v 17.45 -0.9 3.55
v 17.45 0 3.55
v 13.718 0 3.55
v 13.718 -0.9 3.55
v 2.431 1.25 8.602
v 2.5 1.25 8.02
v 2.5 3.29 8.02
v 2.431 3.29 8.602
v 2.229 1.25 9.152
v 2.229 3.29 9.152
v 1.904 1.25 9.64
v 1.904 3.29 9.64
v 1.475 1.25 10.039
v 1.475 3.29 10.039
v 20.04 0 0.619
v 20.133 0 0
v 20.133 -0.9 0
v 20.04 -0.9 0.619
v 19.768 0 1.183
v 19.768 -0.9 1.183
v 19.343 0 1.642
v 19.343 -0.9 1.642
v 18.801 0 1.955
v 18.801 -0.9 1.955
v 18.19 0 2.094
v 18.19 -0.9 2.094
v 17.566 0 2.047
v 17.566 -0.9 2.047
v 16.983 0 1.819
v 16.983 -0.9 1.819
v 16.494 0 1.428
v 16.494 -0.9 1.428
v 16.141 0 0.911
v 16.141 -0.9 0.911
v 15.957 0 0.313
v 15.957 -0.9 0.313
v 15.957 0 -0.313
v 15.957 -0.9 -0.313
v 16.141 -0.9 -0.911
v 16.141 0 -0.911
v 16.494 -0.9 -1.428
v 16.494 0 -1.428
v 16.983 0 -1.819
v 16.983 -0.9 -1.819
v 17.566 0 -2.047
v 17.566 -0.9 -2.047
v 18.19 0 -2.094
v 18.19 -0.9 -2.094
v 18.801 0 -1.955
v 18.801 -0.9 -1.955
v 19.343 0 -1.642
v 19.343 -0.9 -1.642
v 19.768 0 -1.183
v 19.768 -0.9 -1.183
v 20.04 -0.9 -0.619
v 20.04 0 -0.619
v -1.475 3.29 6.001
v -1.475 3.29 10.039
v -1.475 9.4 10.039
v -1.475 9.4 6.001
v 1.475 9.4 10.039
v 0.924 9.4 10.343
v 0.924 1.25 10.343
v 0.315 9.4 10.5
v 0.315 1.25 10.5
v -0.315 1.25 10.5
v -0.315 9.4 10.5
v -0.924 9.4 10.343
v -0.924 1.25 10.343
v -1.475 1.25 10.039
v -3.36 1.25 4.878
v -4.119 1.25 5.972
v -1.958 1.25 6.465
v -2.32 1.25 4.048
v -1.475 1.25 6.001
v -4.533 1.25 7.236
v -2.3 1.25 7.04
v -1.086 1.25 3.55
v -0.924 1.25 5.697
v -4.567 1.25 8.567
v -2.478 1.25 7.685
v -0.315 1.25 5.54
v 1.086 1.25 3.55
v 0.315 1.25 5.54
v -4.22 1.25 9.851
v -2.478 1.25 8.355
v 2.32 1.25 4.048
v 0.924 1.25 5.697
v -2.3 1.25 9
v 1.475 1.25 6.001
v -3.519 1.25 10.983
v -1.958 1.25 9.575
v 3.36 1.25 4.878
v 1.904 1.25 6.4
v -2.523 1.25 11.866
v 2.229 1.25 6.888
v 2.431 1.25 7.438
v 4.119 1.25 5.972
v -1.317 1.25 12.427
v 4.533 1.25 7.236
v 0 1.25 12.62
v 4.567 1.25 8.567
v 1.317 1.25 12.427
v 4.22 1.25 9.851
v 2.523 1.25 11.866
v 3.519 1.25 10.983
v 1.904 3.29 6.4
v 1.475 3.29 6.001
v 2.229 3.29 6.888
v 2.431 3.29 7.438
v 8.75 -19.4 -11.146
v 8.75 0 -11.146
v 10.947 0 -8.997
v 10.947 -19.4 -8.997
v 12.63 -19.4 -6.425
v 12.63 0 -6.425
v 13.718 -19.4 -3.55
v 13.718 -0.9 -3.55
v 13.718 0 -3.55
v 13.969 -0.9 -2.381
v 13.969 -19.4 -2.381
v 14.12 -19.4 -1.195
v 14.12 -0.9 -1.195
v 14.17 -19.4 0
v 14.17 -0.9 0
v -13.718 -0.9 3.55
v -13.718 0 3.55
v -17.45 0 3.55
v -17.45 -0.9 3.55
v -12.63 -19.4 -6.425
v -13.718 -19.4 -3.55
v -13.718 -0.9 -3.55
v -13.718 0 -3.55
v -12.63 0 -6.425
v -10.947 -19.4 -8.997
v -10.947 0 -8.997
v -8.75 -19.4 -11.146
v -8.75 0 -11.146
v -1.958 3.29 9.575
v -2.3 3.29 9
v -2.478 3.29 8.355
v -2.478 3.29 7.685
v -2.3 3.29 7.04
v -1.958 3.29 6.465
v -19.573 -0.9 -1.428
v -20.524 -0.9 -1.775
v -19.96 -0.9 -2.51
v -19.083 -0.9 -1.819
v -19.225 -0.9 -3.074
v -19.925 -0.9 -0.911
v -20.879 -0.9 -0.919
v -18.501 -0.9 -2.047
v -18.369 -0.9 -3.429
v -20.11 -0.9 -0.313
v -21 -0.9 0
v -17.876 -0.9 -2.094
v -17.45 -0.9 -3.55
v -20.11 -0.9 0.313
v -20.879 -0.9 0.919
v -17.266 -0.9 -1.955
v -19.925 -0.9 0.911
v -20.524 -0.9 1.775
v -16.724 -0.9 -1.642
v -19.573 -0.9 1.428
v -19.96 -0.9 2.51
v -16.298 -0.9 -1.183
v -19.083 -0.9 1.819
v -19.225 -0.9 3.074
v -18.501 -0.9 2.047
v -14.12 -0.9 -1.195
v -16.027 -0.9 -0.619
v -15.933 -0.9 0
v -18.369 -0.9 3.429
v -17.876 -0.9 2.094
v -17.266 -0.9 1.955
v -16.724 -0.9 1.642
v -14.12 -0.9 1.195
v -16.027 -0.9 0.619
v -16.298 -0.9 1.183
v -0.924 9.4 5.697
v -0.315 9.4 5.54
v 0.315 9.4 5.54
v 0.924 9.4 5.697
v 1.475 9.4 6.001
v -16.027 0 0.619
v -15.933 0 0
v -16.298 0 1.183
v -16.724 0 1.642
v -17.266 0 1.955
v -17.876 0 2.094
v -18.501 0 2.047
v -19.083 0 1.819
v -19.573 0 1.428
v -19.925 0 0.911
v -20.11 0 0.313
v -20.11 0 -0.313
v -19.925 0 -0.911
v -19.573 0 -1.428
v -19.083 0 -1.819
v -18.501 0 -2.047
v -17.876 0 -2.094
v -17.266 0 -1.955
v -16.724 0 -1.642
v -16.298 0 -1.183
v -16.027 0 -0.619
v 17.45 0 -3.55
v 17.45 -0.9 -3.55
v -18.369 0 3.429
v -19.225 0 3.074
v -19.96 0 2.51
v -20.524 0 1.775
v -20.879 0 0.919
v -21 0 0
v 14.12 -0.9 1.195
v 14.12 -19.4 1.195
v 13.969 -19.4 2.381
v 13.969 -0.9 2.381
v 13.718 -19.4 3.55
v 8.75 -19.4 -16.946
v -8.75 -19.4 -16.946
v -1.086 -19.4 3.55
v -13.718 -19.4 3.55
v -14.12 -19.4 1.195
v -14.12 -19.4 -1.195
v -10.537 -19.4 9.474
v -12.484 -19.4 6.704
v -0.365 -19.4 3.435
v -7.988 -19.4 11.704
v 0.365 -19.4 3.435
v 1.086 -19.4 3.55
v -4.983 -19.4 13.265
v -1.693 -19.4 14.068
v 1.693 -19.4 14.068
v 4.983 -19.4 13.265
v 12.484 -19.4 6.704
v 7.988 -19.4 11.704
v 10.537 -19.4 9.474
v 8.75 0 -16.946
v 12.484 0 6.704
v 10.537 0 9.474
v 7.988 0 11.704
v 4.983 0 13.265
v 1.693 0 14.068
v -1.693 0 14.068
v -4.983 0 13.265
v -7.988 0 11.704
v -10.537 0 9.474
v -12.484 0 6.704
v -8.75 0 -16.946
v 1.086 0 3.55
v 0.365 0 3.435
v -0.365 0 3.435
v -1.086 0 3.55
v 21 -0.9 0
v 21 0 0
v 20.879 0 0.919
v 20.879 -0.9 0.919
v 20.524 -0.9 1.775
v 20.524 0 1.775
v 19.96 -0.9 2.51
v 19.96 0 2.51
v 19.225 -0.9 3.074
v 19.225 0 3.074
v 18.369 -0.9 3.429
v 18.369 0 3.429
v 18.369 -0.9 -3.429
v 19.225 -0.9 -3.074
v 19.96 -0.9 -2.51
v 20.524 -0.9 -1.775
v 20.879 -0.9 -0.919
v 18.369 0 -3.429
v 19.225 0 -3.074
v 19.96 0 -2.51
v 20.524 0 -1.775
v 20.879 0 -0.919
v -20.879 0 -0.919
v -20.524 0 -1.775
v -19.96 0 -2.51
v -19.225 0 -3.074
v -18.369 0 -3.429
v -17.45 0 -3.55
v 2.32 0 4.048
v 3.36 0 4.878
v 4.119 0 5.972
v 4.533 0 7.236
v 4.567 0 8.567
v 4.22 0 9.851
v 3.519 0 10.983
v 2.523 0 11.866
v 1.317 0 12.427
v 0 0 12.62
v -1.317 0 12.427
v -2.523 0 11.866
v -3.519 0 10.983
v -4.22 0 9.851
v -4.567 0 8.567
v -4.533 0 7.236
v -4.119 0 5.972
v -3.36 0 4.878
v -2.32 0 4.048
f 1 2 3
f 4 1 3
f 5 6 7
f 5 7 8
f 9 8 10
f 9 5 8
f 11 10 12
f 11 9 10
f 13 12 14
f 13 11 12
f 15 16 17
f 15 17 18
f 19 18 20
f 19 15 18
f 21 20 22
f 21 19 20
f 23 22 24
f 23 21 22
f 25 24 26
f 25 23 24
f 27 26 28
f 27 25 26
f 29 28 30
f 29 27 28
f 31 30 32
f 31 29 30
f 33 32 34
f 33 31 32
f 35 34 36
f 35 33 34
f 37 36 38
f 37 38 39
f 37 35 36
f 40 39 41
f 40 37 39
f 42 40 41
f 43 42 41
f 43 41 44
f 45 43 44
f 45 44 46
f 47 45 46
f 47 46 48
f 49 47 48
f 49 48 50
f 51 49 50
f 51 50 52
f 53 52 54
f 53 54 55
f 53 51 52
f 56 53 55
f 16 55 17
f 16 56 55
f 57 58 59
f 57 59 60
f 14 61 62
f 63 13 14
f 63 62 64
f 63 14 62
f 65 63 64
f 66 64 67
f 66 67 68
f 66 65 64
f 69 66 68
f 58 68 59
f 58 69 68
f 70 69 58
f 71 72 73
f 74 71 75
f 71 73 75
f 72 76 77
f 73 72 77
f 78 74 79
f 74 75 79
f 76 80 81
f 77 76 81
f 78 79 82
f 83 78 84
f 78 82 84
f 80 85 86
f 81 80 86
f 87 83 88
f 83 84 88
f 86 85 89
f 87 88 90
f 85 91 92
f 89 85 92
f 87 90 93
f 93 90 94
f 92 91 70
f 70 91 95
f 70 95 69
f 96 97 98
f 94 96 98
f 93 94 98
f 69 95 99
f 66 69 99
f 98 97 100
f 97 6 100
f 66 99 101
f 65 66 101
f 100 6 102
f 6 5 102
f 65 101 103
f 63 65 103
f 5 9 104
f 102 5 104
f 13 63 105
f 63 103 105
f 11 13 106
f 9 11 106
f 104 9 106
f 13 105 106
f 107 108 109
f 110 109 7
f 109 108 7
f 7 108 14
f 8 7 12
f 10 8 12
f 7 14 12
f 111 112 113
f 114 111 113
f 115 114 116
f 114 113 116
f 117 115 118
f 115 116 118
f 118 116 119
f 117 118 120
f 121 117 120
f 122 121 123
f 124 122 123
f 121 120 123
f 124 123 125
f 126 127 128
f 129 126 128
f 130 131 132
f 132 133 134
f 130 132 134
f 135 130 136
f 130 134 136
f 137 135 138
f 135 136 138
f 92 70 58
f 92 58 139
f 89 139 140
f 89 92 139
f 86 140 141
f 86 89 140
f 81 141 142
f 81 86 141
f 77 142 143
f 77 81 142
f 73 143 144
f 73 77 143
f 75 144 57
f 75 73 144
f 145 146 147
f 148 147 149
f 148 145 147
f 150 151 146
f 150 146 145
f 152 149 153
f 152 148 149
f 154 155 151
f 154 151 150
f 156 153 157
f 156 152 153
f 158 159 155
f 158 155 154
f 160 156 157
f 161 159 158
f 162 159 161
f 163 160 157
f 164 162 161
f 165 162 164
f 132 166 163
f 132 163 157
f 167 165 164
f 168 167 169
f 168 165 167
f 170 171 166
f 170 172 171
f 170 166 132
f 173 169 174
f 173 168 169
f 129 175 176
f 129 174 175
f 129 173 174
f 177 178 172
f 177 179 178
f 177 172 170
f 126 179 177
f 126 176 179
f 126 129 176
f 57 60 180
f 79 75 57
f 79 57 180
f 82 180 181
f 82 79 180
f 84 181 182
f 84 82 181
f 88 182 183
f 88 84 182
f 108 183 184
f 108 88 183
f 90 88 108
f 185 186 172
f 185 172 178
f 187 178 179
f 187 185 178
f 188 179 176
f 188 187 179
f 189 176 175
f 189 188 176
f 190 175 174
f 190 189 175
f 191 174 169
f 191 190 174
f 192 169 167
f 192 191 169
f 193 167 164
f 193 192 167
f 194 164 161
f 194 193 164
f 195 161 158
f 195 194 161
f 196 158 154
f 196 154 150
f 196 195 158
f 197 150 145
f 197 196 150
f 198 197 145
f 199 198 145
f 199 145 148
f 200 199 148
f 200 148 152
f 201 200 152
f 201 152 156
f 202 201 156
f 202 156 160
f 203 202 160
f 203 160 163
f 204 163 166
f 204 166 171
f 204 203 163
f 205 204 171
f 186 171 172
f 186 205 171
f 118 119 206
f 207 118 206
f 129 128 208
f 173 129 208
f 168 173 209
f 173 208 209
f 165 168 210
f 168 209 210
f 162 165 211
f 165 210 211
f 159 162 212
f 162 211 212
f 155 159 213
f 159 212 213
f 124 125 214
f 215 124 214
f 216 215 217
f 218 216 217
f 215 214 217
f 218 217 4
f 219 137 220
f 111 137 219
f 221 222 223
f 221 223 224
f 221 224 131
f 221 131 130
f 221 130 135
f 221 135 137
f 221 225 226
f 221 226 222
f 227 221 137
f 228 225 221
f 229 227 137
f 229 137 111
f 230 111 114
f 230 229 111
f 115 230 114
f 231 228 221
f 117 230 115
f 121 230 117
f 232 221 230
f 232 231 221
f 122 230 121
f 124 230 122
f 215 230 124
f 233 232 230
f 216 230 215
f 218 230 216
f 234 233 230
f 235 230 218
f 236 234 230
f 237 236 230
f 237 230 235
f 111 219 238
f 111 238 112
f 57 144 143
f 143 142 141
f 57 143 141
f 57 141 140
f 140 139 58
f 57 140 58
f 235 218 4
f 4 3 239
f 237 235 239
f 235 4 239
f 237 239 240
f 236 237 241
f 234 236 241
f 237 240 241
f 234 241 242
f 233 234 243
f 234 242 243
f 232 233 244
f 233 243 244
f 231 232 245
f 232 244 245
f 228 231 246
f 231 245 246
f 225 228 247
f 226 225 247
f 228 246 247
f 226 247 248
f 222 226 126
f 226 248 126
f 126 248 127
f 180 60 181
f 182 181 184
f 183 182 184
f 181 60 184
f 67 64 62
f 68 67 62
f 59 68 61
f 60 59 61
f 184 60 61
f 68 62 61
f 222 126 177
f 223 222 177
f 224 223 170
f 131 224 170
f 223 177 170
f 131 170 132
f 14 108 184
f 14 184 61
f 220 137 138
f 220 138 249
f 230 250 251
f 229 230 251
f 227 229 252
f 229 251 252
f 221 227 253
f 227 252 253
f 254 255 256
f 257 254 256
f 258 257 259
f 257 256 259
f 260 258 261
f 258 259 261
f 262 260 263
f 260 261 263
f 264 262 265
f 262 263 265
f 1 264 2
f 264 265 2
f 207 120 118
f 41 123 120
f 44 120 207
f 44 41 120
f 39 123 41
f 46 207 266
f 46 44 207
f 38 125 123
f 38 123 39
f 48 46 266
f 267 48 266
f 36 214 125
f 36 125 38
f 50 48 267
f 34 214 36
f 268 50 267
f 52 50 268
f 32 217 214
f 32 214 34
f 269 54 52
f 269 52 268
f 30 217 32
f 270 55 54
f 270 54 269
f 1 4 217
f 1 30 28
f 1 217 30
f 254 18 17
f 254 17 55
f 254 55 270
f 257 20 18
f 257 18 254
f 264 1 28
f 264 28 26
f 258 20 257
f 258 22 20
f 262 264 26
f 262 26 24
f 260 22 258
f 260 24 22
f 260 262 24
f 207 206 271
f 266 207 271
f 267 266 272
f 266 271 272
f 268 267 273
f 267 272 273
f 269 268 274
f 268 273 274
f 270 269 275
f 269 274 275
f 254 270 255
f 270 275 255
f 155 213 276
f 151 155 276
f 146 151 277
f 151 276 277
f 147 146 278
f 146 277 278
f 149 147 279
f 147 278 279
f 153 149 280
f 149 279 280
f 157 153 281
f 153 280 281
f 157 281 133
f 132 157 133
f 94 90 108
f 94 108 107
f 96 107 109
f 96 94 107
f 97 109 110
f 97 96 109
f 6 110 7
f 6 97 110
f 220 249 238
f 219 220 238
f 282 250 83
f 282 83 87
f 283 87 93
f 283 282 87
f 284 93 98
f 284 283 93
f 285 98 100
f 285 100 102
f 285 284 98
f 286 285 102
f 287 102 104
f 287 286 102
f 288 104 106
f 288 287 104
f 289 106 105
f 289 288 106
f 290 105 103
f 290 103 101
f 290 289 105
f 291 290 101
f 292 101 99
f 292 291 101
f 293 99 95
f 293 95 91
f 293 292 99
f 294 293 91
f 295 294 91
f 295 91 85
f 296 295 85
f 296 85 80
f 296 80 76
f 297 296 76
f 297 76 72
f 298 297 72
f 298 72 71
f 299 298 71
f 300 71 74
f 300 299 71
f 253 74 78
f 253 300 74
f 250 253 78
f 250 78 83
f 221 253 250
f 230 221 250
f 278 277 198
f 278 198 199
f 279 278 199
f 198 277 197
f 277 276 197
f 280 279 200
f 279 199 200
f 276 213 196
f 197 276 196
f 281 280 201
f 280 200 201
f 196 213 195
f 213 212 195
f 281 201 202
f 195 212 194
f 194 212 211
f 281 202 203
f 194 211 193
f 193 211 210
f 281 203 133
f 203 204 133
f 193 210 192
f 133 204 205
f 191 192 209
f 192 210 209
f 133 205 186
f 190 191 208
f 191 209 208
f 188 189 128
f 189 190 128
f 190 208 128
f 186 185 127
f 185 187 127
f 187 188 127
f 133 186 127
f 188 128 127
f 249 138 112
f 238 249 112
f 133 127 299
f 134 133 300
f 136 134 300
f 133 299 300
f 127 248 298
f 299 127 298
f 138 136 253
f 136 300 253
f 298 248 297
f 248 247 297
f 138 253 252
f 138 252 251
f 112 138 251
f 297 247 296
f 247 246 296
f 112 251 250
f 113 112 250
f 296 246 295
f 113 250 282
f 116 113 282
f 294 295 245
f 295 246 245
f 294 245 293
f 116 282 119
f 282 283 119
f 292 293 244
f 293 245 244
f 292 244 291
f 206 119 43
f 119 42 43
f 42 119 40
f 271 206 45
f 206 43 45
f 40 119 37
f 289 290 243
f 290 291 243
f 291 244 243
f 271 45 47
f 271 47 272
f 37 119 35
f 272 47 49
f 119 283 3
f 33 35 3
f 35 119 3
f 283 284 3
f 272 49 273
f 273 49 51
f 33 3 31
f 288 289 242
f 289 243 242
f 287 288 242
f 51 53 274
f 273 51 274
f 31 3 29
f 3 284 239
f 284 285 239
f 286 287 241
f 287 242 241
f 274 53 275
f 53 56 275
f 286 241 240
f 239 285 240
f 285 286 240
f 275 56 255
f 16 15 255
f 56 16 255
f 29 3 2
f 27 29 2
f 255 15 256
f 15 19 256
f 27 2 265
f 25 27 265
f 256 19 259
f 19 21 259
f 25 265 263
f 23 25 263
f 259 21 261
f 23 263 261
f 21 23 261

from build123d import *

# Parameters (mm, degrees)
F1_DEPTH = 19.4
F0_R     = 2.1
F2_DEPTH = 0.9
F3_DEPTH = 1.25
F4_DEPTH = 3.29
F5_DEPTH = 9.4


with BuildPart() as f1:
    # F0 (on Front) → F1 (new body)
    with BuildSketch(Plane.XZ):
        with BuildLine():
            ThreePointArc((-13.7181048254, 3.55), (-14.17, 0), (-13.7181048254, -3.55))
            Line((-13.7181048254, -3.55), (13.7181048254, -3.55))
            ThreePointArc((13.7181048254, -3.55), (14.056572224, -1.7893231436), (14.17, 0))
            ThreePointArc((14.17, 0), (14.056572224, 1.7893231436), (13.7181048254, 3.55))
            Line((13.7181048254, 3.55), (1.0858637115, 3.55))
            ThreePointArc((1.0858637115, 3.55), (0, 3.42), (-1.0858637115, 3.55))
            Line((-1.0858637115, 3.55), (-13.7181048254, 3.55))
        make_face()
        with BuildLine():
            ThreePointArc((13.7181048254, 3.55), (0, 14.17), (-13.7181048254, 3.55))
            Line((-13.7181048254, 3.55), (-1.0858637115, 3.55))
            ThreePointArc((-1.0858637115, 3.55), (-2.842976163, 11.6362807602), (4.6, 8.02))
            ThreePointArc((4.6, 8.02), (3.6162807602, 5.177023837), (1.0858637115, 3.55))
            Line((1.0858637115, 3.55), (13.7181048254, 3.55))
        make_face()
        with BuildLine():
            ThreePointArc((-13.7181048254, -3.55), (-11.8586491349, -7.7563741977), (-8.75, -11.1456897499))
            Line((-8.75, -11.1456897499), (8.75, -11.1456897499))
            ThreePointArc((8.75, -11.1456897499), (11.8586491349, -7.7563741977), (13.7181048254, -3.55))
            Line((13.7181048254, -3.55), (-13.7181048254, -3.55))
        make_face()
        with BuildLine():
            ThreePointArc((8.75, -11.1456897499), (0, -14.17), (-8.75, -11.1456897499))
            Line((-8.75, -11.1456897499), (-8.75, -16.9456897499))
            Line((-8.75, -16.9456897499), (8.75, -16.9456897499))
            Line((8.75, -16.9456897499), (8.75, -11.1456897499))
        make_face()
        with BuildLine():
            Line((8.75, -11.1456897499), (-8.75, -11.1456897499))
            ThreePointArc((-8.75, -11.1456897499), (0, -14.17), (8.75, -11.1456897499))
        make_face()
        with BuildLine():
            ThreePointArc((4.6, 8.02), (-2.842976163, 11.6362807602), (-1.0858637115, 3.55))
            Line((-1.0858637115, 3.55), (1.0858637115, 3.55))
            ThreePointArc((1.0858637115, 3.55), (3.6162807602, 5.177023837), (4.6, 8.02))
        make_face()
        with BuildLine():
            ThreePointArc((1.475, 10.0385081124), (2.2290693125, 9.1519231423), (2.5, 8.02))
            ThreePointArc((2.5, 8.02), (2.2290693125, 6.8880768577), (1.475, 6.0014918876))
            ThreePointArc((1.475, 6.0014918876), (0, 5.52), (-1.475, 6.0014918876))
            ThreePointArc((-1.475, 6.0014918876), (-2.5, 8.02), (-1.475, 10.0385081124))
            ThreePointArc((-1.475, 10.0385081124), (0, 10.52), (1.475, 10.0385081124))
        make_face(mode=Mode.SUBTRACT)
        with BuildLine():
            Line((1.475, 6.0014918876), (1.475, 10.0385081124))
            ThreePointArc((1.475, 10.0385081124), (0, 10.52), (-1.475, 10.0385081124))
            Line((-1.475, 10.0385081124), (-1.475, 6.0014918876))
            ThreePointArc((-1.475, 6.0014918876), (0, 5.52), (1.475, 6.0014918876))
        make_face()
        with BuildLine():
            ThreePointArc((1.475, 6.0014918876), (2.2290693125, 6.8880768577), (2.5, 8.02))
            ThreePointArc((2.5, 8.02), (2.2290693125, 9.1519231423), (1.475, 10.0385081124))
            Line((1.475, 10.0385081124), (1.475, 6.0014918876))
        make_face()
        with BuildLine():
            Line((-1.475, 6.0014918876), (-1.475, 10.0385081124))
            ThreePointArc((-1.475, 10.0385081124), (-2.5, 8.02), (-1.475, 6.0014918876))
        make_face()
    extrude(amount=F1_DEPTH)

    # F0 (on Front) → F2 (join)
    with BuildSketch(Plane.XZ):
        with BuildLine():
            ThreePointArc((14.17, 0), (14.056572224, -1.7893231436), (13.7181048254, -3.55))
            Line((13.7181048254, -3.55), (17.45, -3.55))
            ThreePointArc((17.45, -3.55), (19.9602290732, -2.5102290732), (21, 0))
            ThreePointArc((21, 0), (19.9602290732, 2.5102290732), (17.45, 3.55))
            Line((17.45, 3.55), (13.7181048254, 3.55))
            ThreePointArc((13.7181048254, 3.55), (14.056572224, 1.7893231436), (14.17, 0))
        make_face()
        with Locations((18.0333442986, 0)):
            Circle(F0_R, mode=Mode.SUBTRACT)
        with BuildLine():
            Line((-17.45, -3.55), (-13.7181048254, -3.55))
            ThreePointArc((-13.7181048254, -3.55), (-14.17, 0), (-13.7181048254, 3.55))
            Line((-13.7181048254, 3.55), (-17.45, 3.55))
            ThreePointArc((-17.45, 3.55), (-19.9602290732, 2.5102290732), (-21, 0))
            ThreePointArc((-21, 0), (-19.9602290732, -2.5102290732), (-17.45, -3.55))
        make_face()
        with Locations((-18.0333442986, 0)):
            Circle(F0_R, mode=Mode.SUBTRACT)
    extrude(amount=F2_DEPTH)

    # F0 (on Front) → F3 (join)
    with BuildSketch(Plane.XZ):
        with BuildLine():
            ThreePointArc((4.6, 8.02), (-2.842976163, 11.6362807602), (-1.0858637115, 3.55))
            Line((-1.0858637115, 3.55), (1.0858637115, 3.55))
            ThreePointArc((1.0858637115, 3.55), (3.6162807602, 5.177023837), (4.6, 8.02))
        make_face()
        with BuildLine():
            ThreePointArc((1.475, 10.0385081124), (2.2290693125, 9.1519231423), (2.5, 8.02))
            ThreePointArc((2.5, 8.02), (2.2290693125, 6.8880768577), (1.475, 6.0014918876))
            ThreePointArc((1.475, 6.0014918876), (0, 5.52), (-1.475, 6.0014918876))
            ThreePointArc((-1.475, 6.0014918876), (-2.5, 8.02), (-1.475, 10.0385081124))
            ThreePointArc((-1.475, 10.0385081124), (0, 10.52), (1.475, 10.0385081124))
        make_face(mode=Mode.SUBTRACT)
    extrude(amount=-F3_DEPTH)

    # F0 (on Front) → F4 (join)
    with BuildSketch(Plane.XZ):
        with BuildLine():
            Line((-1.475, 6.0014918876), (-1.475, 10.0385081124))
            ThreePointArc((-1.475, 10.0385081124), (-2.5, 8.02), (-1.475, 6.0014918876))
        make_face()
        with BuildLine():
            Line((1.475, 6.0014918876), (1.475, 10.0385081124))
            ThreePointArc((1.475, 10.0385081124), (0, 10.52), (-1.475, 10.0385081124))
            Line((-1.475, 10.0385081124), (-1.475, 6.0014918876))
            ThreePointArc((-1.475, 6.0014918876), (0, 5.52), (1.475, 6.0014918876))
        make_face()
        with BuildLine():
            ThreePointArc((1.475, 6.0014918876), (2.2290693125, 6.8880768577), (2.5, 8.02))
            ThreePointArc((2.5, 8.02), (2.2290693125, 9.1519231423), (1.475, 10.0385081124))
            Line((1.475, 10.0385081124), (1.475, 6.0014918876))
        make_face()
    extrude(amount=-F4_DEPTH)

    # F0 (on Front) → F5 (join)
    with BuildSketch(Plane.XZ):
        with BuildLine():
            Line((1.475, 6.0014918876), (1.475, 10.0385081124))
            ThreePointArc((1.475, 10.0385081124), (0, 10.52), (-1.475, 10.0385081124))
            Line((-1.475, 10.0385081124), (-1.475, 6.0014918876))
            ThreePointArc((-1.475, 6.0014918876), (0, 5.52), (1.475, 6.0014918876))
        make_face()
    extrude(amount=-F5_DEPTH)


solid = f1.part
